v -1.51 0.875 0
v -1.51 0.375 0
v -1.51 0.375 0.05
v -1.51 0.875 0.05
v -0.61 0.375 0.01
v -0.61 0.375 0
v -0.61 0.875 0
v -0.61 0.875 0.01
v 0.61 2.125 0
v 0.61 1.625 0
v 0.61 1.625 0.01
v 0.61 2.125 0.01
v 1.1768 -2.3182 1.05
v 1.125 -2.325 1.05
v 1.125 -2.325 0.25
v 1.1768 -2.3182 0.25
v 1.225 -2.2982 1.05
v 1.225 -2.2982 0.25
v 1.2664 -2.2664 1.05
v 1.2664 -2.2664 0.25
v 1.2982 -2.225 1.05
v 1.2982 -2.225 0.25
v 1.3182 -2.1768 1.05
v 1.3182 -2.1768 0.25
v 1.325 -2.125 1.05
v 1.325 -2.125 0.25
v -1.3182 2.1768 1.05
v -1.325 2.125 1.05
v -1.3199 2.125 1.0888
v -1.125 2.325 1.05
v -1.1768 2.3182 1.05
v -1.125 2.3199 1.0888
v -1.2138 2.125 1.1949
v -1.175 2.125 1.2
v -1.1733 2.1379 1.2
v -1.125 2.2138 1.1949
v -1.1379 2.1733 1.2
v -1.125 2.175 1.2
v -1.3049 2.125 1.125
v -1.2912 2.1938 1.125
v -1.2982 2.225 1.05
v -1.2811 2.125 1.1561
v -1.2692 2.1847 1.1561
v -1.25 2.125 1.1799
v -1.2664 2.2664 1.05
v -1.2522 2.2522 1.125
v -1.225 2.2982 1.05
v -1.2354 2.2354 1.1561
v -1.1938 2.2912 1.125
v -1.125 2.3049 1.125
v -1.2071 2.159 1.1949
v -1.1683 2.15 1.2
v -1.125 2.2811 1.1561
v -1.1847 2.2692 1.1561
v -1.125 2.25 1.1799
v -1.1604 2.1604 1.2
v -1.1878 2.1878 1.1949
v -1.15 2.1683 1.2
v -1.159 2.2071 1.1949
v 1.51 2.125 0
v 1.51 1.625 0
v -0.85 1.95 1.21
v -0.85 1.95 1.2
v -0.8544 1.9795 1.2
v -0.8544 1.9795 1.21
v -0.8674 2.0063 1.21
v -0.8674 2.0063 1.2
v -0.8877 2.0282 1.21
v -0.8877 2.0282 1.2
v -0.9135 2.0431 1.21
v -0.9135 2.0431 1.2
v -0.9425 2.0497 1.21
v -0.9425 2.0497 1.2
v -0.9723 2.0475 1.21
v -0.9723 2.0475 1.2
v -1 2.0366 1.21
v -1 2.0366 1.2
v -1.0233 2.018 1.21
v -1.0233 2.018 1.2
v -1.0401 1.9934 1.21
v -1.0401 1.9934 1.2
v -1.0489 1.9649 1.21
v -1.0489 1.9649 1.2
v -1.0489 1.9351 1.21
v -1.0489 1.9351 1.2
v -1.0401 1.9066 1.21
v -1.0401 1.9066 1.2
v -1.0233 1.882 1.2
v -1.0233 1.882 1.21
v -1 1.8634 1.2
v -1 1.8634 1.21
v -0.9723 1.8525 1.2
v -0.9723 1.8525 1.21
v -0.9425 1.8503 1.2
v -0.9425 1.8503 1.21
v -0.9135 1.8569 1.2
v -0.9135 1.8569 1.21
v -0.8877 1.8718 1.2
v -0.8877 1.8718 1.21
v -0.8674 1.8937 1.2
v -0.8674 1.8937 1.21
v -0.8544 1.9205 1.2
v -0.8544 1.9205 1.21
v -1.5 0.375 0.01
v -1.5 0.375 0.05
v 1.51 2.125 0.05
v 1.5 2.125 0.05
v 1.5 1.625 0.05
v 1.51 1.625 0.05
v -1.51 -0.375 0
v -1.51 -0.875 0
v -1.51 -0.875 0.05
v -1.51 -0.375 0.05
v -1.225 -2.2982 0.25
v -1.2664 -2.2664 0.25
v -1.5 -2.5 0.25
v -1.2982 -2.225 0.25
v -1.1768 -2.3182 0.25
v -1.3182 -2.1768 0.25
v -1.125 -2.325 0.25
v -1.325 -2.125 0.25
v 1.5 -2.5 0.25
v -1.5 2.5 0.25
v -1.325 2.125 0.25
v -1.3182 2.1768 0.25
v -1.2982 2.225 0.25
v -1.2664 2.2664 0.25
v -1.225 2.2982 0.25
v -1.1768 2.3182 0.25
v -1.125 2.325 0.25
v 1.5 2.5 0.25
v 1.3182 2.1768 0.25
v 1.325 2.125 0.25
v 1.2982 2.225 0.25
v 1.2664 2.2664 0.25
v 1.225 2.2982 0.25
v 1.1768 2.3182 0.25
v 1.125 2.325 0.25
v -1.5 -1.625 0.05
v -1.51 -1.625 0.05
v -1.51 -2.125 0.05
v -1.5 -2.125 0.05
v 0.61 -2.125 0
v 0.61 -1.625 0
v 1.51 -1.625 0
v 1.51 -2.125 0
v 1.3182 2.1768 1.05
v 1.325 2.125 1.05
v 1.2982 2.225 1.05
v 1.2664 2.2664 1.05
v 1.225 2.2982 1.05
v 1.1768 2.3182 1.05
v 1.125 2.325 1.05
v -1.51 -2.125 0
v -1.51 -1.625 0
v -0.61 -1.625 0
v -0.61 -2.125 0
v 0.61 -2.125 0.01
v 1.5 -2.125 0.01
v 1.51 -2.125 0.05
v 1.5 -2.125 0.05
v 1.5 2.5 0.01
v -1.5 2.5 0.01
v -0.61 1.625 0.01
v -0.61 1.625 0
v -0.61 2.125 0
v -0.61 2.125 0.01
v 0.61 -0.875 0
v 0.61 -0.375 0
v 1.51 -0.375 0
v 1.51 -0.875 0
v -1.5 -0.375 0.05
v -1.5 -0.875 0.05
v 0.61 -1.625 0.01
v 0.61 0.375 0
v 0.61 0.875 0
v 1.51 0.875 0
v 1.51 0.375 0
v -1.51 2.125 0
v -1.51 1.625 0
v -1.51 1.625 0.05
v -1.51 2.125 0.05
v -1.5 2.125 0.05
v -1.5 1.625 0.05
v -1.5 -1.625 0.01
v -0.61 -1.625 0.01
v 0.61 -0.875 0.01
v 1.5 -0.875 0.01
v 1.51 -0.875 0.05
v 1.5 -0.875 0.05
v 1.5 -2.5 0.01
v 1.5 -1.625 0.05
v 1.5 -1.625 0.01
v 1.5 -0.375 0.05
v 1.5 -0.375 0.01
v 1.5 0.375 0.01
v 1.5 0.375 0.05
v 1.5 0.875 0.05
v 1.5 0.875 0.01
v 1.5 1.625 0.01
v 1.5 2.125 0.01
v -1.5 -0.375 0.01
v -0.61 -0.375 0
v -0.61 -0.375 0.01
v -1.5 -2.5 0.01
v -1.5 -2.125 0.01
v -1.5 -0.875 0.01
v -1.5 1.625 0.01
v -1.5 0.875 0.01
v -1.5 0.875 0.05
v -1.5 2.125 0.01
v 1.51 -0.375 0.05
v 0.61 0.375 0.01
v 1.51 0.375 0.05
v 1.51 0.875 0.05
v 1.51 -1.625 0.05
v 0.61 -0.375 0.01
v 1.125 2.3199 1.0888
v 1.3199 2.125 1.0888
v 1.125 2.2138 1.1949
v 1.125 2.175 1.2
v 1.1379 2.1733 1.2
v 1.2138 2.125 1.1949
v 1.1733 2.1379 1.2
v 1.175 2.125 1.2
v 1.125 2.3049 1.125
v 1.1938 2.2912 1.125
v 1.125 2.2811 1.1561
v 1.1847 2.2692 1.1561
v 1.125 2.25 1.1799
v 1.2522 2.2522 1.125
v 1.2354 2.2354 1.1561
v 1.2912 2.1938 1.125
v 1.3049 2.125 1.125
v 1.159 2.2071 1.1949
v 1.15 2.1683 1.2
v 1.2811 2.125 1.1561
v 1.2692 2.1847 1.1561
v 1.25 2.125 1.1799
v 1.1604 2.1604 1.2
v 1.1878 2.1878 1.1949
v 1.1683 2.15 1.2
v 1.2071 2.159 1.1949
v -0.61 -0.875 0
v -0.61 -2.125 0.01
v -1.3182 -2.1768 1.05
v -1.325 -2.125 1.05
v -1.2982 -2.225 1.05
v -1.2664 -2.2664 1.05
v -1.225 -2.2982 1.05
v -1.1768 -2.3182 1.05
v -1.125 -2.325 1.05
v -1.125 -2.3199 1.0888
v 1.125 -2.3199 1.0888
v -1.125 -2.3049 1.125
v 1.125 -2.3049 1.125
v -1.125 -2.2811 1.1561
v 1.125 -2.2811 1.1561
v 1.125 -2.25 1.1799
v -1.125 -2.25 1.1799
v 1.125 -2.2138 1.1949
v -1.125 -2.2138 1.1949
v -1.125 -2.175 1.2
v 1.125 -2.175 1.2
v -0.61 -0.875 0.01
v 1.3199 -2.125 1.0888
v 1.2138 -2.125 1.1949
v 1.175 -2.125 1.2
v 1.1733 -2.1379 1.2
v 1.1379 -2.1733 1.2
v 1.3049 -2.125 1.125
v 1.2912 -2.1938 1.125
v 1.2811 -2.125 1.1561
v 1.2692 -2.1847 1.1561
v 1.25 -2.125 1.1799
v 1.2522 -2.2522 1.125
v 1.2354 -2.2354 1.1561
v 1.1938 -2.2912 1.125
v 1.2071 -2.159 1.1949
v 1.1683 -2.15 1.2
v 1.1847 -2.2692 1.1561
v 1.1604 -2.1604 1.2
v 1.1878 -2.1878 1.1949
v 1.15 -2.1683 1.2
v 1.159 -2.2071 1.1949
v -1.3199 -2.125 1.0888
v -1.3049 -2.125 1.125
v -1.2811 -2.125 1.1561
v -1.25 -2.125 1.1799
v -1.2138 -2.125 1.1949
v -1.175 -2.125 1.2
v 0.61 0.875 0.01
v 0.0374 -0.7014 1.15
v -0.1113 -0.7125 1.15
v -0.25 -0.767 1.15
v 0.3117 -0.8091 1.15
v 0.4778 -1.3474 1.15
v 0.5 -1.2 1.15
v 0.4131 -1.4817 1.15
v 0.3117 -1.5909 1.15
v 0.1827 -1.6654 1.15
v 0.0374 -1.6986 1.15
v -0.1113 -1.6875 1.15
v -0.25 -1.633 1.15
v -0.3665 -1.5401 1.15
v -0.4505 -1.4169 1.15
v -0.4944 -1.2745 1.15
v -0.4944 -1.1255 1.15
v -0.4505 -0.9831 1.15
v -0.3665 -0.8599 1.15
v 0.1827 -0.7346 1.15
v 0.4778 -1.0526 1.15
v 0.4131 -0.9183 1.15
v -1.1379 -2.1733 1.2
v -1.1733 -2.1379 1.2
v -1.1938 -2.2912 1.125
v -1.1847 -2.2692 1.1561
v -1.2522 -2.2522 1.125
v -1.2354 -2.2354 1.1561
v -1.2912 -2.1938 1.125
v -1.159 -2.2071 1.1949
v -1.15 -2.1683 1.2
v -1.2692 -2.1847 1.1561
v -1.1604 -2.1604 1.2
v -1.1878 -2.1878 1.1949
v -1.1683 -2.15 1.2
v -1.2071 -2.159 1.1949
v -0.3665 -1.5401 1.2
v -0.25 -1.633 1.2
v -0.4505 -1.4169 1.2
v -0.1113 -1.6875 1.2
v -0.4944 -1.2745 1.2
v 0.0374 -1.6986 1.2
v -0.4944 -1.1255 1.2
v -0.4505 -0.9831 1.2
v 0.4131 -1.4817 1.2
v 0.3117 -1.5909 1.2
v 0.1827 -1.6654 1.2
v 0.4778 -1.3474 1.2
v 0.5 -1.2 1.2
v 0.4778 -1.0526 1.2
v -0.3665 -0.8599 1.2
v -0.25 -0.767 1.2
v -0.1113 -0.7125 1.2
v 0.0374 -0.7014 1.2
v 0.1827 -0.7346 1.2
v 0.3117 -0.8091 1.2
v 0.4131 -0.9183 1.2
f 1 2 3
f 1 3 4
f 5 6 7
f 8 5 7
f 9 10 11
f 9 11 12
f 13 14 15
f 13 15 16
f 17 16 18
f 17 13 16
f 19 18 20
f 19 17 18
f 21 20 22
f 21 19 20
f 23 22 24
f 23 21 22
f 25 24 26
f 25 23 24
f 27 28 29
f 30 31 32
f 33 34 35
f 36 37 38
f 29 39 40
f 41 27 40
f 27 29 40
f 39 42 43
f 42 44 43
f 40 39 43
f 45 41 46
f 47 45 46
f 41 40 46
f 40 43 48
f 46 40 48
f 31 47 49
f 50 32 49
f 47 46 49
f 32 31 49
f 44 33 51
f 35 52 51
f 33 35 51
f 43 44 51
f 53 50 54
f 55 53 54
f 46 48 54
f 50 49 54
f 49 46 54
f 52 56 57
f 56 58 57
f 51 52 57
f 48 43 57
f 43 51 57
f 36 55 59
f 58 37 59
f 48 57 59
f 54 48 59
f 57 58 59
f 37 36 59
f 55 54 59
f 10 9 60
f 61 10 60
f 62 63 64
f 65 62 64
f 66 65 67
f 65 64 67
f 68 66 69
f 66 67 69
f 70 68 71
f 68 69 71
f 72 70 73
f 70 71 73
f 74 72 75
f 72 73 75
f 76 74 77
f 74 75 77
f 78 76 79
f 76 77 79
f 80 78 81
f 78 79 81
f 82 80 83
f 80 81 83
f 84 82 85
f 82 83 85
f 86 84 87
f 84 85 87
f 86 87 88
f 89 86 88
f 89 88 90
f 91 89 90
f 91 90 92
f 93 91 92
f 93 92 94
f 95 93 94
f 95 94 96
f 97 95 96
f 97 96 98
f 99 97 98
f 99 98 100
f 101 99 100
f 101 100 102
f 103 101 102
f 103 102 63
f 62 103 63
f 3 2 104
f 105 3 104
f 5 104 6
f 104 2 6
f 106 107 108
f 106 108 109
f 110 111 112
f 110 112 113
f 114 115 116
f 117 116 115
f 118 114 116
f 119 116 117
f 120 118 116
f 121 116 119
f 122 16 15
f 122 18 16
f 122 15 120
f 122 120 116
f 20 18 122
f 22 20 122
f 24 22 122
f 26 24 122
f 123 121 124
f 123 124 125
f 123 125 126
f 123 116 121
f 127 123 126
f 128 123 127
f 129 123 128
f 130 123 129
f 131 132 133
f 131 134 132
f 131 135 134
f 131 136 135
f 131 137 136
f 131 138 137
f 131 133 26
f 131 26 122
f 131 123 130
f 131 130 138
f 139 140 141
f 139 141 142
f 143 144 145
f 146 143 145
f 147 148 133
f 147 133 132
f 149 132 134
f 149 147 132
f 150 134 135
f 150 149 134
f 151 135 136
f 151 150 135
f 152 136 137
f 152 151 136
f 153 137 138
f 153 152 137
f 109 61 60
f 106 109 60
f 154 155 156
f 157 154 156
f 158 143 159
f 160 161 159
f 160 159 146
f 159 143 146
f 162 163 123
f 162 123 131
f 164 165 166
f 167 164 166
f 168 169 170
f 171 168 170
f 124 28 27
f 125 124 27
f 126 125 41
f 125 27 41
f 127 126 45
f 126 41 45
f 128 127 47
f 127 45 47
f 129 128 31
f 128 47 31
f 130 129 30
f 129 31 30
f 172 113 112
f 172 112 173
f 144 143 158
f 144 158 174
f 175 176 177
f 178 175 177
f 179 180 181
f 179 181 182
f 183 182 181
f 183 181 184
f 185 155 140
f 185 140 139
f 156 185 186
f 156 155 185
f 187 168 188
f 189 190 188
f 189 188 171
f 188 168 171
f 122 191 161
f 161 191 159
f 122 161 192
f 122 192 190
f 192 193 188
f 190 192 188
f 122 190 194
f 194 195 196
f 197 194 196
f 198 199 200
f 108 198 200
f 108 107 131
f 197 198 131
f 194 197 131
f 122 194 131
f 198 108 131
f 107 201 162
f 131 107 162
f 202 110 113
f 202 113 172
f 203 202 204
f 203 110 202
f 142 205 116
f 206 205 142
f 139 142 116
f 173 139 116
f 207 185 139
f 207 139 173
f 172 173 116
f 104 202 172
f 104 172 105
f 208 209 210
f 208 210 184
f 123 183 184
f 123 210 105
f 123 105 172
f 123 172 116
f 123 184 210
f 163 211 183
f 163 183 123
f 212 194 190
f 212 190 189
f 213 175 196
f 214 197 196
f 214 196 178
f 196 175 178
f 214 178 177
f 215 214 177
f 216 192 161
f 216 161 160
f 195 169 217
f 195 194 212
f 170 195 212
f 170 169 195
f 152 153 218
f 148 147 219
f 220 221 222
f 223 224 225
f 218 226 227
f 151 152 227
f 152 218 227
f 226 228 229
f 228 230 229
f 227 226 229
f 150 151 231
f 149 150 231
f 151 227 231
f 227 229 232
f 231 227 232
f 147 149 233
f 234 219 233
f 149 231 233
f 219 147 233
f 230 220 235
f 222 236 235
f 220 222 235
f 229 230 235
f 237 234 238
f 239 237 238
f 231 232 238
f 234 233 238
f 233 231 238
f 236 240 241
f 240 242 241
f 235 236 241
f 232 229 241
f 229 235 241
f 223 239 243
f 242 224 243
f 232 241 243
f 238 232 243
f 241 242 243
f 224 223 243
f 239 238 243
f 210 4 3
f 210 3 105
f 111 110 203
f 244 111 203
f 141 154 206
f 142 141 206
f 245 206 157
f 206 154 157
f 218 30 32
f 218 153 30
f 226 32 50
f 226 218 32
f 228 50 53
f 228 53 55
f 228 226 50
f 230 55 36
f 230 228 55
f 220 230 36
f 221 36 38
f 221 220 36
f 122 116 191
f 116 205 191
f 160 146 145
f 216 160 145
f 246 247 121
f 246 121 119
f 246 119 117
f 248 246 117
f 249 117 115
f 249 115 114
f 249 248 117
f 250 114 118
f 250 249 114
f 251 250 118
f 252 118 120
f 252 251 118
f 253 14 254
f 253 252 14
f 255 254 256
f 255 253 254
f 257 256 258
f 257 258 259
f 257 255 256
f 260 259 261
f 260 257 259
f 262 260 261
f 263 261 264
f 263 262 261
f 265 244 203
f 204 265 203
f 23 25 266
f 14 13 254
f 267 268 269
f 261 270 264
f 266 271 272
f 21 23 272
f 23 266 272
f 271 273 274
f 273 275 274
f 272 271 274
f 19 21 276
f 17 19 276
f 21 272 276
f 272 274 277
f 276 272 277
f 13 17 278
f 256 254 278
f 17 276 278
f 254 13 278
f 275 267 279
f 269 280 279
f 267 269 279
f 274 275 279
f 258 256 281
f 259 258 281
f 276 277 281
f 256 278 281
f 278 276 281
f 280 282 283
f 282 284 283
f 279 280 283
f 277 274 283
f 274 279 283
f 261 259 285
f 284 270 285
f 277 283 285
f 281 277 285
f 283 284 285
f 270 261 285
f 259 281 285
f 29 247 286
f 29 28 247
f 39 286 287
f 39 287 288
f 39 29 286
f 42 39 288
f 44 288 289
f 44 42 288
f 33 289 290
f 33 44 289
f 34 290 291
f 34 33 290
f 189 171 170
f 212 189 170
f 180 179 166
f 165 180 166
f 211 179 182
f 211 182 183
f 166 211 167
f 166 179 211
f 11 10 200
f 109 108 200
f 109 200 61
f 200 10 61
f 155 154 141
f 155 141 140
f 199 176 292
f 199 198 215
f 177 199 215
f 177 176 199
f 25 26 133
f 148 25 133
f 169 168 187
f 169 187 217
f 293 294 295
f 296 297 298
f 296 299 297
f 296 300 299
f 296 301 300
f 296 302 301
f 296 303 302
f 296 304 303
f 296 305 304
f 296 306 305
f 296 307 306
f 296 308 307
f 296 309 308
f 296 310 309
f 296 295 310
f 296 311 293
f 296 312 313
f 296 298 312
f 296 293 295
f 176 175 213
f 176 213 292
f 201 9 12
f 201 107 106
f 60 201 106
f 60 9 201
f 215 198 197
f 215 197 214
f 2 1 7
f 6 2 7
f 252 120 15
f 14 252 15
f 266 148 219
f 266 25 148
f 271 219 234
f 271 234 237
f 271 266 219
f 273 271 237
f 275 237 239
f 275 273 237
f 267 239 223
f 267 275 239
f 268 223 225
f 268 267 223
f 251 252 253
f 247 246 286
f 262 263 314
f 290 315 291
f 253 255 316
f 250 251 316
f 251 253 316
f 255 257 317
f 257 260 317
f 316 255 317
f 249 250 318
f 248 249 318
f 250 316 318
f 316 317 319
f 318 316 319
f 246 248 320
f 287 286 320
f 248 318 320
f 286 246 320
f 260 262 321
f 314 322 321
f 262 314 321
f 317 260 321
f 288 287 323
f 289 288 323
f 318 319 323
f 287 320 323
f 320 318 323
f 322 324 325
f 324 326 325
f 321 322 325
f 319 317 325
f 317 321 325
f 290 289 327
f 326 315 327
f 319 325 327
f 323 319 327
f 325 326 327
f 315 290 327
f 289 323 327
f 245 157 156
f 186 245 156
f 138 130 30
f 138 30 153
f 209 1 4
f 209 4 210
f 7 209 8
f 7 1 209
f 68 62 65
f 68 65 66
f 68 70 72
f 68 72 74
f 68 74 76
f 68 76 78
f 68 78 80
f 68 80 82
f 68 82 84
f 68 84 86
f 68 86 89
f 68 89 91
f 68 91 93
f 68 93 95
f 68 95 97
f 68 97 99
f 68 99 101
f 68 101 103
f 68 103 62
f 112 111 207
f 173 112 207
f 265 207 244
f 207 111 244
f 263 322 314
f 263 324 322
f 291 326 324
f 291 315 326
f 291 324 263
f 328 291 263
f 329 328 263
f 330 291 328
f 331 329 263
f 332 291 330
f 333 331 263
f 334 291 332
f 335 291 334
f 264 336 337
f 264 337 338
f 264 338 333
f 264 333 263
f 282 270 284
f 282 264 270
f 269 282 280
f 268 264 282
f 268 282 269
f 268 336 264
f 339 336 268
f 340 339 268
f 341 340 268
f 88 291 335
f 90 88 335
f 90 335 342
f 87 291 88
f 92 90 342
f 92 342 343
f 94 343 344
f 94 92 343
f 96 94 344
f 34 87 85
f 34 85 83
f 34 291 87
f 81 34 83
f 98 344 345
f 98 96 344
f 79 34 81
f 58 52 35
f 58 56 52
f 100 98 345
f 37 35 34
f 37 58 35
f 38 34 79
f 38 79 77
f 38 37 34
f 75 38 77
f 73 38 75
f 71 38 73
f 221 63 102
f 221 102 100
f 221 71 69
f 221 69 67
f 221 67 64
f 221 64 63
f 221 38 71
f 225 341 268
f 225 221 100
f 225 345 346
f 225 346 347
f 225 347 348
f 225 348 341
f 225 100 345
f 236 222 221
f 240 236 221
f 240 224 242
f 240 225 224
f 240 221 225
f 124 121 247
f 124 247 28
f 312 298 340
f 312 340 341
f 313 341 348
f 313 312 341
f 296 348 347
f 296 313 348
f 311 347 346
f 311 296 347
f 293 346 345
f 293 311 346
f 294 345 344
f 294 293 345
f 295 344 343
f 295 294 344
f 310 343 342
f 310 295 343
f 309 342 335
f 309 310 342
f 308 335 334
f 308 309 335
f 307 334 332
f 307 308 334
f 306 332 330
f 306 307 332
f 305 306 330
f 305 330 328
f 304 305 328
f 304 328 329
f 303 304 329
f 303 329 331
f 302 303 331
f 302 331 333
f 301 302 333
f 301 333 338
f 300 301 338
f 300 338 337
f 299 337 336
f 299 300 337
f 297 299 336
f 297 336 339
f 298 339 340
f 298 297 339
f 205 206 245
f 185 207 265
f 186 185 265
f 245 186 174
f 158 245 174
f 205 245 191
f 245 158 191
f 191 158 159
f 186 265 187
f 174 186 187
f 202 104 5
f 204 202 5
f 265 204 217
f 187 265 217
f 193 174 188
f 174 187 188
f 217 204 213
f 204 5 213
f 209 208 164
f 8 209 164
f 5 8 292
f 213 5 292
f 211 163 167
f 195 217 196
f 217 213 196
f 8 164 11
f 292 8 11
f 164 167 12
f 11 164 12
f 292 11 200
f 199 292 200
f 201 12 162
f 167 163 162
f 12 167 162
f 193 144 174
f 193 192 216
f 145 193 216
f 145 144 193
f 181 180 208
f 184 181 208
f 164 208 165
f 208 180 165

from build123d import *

# Parameters (mm, degrees)
BOX008_W          = 0.9
BOX008_H          = 0.5
BOX008_DEPTH      = 0.05
BOX009_W          = 0.9
BOX009_H          = 0.5
BOX009_DEPTH      = 0.05
BOX010_W          = 0.9
BOX010_H          = 0.5
BOX010_DEPTH      = 0.05
BOX007_W          = 0.9
BOX007_H          = 0.5
BOX007_DEPTH      = 0.05
BOX003_W          = 0.9
BOX003_H          = 0.5
BOX003_DEPTH      = 0.05
BOX006_W          = 0.9
BOX006_H          = 0.5
BOX006_DEPTH      = 0.05
BOX004_W          = 0.9
BOX004_H          = 0.5
BOX004_DEPTH      = 0.05
BOX005_W          = 0.9
BOX005_H          = 0.5
BOX005_DEPTH      = 0.05
CYLINDER_R        = 0.5
CYLINDER_DEPTH    = 0.2
BOX002_W          = 2.65
BOX002_H          = 4.65
BOX002_DEPTH      = 0.95
FILLET_R          = 0.2
FILLET001_R       = 0.15
BOX001_W          = 3
BOX001_H          = 5
BOX001_DEPTH      = 0.1
CYLINDER001_R     = 1
CYLINDER001_DEPTH = 0.1
CYLINDER002_R     = 0.1
CYLINDER002_DEPTH = 0.21
BOX_W             = 3
BOX_H             = 5
BOX_DEPTH         = 0.14


with BuildPart() as cube006:
    # Box008 → Box008 (new body)
    with BuildSketch(Plane(origin=(0.61, 0.375, 0), x_dir=(1, 0, 0), z_dir=(0, 0, 1))):
        with Locations((0.45, 0.25)):
            Rectangle(BOX008_W, BOX008_H)
    extrude(amount=BOX008_DEPTH)


with BuildPart() as cube007:
    # Box009 → Box009 (new body)
    with BuildSketch(Plane(origin=(0.61, -2.125, 0), x_dir=(1, 0, 0), z_dir=(0, 0, 1))):
        with Locations((0.45, 0.25)):
            Rectangle(BOX009_W, BOX009_H)
    extrude(amount=BOX009_DEPTH)


with BuildPart() as cube008:
    # Box010 → Box010 (new body)
    with BuildSketch(Plane(origin=(0.61, 1.625, 0), x_dir=(1, 0, 0), z_dir=(0, 0, 1))):
        with Locations((0.45, 0.25)):
            Rectangle(BOX010_W, BOX010_H)
    extrude(amount=BOX010_DEPTH)


with BuildPart() as fusion002:
    # Box007 → Box007 (new body)
    with BuildSketch(Plane(origin=(0.61, -0.875, 0), x_dir=(1, 0, 0), z_dir=(0, 0, 1))):
        with Locations((0.45, 0.25)):
            Rectangle(BOX007_W, BOX007_H)
    extrude(amount=BOX007_DEPTH)

    # Fusion002: union Cube006, Cube007, Cube008
    add(cube006.part)
    add(cube007.part)
    add(cube008.part)


with BuildPart() as fusion002_1:
    # Fusion002 placement: moved
    add(fusion002.part.moved(Location((-2.12, 0, 0))))


with BuildPart() as cube001:
    # Box003 → Box003 (new body)
    with BuildSketch(Plane(origin=(0.61, 0.375, 0), x_dir=(1, 0, 0), z_dir=(0, 0, 1))):
        with Locations((0.45, 0.25)):
            Rectangle(BOX003_W, BOX003_H)
    extrude(amount=BOX003_DEPTH)


with BuildPart() as cube004:
    # Box006 → Box006 (new body)
    with BuildSketch(Plane(origin=(0.61, -2.125, 0), x_dir=(1, 0, 0), z_dir=(0, 0, 1))):
        with Locations((0.45, 0.25)):
            Rectangle(BOX006_W, BOX006_H)
    extrude(amount=BOX006_DEPTH)


with BuildPart() as cube002:
    # Box004 → Box004 (new body)
    with BuildSketch(Plane(origin=(0.61, 1.625, 0), x_dir=(1, 0, 0), z_dir=(0, 0, 1))):
        with Locations((0.45, 0.25)):
            Rectangle(BOX004_W, BOX004_H)
    extrude(amount=BOX004_DEPTH)


with BuildPart() as pads:
    # Box005 → Box005 (new body)
    with BuildSketch(Plane(origin=(0.61, -0.875, 0), x_dir=(1, 0, 0), z_dir=(0, 0, 1))):
        with Locations((0.45, 0.25)):
            Rectangle(BOX005_W, BOX005_H)
    extrude(amount=BOX005_DEPTH)

    # Fusion001: union Cube001, Cube004, Cube002
    add(cube001.part)
    add(cube004.part)
    add(cube002.part)

    # Fusion003: union Fusion002
    add(fusion002_1.part)


with BuildPart() as cylinder:
    # Cylinder → Cylinder (new body)
    with BuildSketch(Plane(origin=(0, -1.2, 1.1), x_dir=(1, 0, 0), z_dir=(0, 0, 1))):
        Circle(CYLINDER_R)
    extrude(amount=CYLINDER_DEPTH)


with BuildPart() as cut:
    # Box002 → Box002 (new body)
    with BuildSketch(Plane(origin=(-1.325, -2.325, 0.25), x_dir=(1, 0, 0), z_dir=(0, 0, 1))):
        with Locations((1.325, 2.325)):
            Rectangle(BOX002_W, BOX002_H)
    extrude(amount=BOX002_DEPTH)

    # Fillet
    fillet_edges = [cut.edges().sort_by_distance(p)[0] for p in [
        (-1.325, -2.325, 0.725),
        (-1.325, 2.325, 0.725),
        (1.325, -2.325, 0.725),
        (1.325, 2.325, 0.725),
    ]]
    fillet(fillet_edges, radius=FILLET_R)

    # Fillet001
    fillet001_edges = [cut.edges().sort_by_distance(p)[0] for p in [
        (-1.325, 0, 1.2),
        (-1.266421, -2.266421, 1.2),
        (-1.266421, 2.266421, 1.2),
        (0, -2.325, 1.2),
        (0, 2.325, 1.2),
        (1.266421, -2.266421, 1.2),
        (1.266421, 2.266421, 1.2),
        (1.325, 0, 1.2),
    ]]
    fillet(fillet001_edges, radius=FILLET001_R)

    # Cut: cut Cylinder
    add(cylinder.part, mode=Mode.SUBTRACT)


with BuildPart() as body:
    # Box001 → Box001 (new body)
    with BuildSketch(Plane(origin=(-1.5, -2.5, 0.15), x_dir=(1, 0, 0), z_dir=(0, 0, 1))):
        with Locations((1.5, 2.5)):
            Rectangle(BOX001_W, BOX001_H)
    extrude(amount=BOX001_DEPTH)

    # Fusion: union Cut
    add(cut.part)


with BuildPart() as air_vent_hole:
    # Cylinder001 → Cylinder001 (new body)
    with BuildSketch(Plane(origin=(0, -1.2, 1.05), x_dir=(1, 0, 0), z_dir=(0, 0, 1))):
        Circle(CYLINDER001_R)
    extrude(amount=CYLINDER001_DEPTH)


with BuildPart() as pin_1_marker:
    # Cylinder002 → Cylinder002 (new body)
    with BuildSketch(Plane(origin=(-0.95, 1.95, 1), x_dir=(1, 0, 0), z_dir=(0, 0, 1))):
        Circle(CYLINDER002_R)
    extrude(amount=CYLINDER002_DEPTH)


with BuildPart() as mpl115a1:
    # Box → Box (new body)
    with BuildSketch(Plane(origin=(-1.5, -2.5, 0.01), x_dir=(1, 0, 0), z_dir=(0, 0, 1))):
        with Locations((1.5, 2.5)):
            Rectangle(BOX_W, BOX_H)
    extrude(amount=BOX_DEPTH)

    # Fusion004: union Pads, Body, Air vent hole, Pin 1 marker
    add(pads.part)
    add(body.part)
    add(air_vent_hole.part)
    add(pin_1_marker.part)


solid = mpl115a1.part
